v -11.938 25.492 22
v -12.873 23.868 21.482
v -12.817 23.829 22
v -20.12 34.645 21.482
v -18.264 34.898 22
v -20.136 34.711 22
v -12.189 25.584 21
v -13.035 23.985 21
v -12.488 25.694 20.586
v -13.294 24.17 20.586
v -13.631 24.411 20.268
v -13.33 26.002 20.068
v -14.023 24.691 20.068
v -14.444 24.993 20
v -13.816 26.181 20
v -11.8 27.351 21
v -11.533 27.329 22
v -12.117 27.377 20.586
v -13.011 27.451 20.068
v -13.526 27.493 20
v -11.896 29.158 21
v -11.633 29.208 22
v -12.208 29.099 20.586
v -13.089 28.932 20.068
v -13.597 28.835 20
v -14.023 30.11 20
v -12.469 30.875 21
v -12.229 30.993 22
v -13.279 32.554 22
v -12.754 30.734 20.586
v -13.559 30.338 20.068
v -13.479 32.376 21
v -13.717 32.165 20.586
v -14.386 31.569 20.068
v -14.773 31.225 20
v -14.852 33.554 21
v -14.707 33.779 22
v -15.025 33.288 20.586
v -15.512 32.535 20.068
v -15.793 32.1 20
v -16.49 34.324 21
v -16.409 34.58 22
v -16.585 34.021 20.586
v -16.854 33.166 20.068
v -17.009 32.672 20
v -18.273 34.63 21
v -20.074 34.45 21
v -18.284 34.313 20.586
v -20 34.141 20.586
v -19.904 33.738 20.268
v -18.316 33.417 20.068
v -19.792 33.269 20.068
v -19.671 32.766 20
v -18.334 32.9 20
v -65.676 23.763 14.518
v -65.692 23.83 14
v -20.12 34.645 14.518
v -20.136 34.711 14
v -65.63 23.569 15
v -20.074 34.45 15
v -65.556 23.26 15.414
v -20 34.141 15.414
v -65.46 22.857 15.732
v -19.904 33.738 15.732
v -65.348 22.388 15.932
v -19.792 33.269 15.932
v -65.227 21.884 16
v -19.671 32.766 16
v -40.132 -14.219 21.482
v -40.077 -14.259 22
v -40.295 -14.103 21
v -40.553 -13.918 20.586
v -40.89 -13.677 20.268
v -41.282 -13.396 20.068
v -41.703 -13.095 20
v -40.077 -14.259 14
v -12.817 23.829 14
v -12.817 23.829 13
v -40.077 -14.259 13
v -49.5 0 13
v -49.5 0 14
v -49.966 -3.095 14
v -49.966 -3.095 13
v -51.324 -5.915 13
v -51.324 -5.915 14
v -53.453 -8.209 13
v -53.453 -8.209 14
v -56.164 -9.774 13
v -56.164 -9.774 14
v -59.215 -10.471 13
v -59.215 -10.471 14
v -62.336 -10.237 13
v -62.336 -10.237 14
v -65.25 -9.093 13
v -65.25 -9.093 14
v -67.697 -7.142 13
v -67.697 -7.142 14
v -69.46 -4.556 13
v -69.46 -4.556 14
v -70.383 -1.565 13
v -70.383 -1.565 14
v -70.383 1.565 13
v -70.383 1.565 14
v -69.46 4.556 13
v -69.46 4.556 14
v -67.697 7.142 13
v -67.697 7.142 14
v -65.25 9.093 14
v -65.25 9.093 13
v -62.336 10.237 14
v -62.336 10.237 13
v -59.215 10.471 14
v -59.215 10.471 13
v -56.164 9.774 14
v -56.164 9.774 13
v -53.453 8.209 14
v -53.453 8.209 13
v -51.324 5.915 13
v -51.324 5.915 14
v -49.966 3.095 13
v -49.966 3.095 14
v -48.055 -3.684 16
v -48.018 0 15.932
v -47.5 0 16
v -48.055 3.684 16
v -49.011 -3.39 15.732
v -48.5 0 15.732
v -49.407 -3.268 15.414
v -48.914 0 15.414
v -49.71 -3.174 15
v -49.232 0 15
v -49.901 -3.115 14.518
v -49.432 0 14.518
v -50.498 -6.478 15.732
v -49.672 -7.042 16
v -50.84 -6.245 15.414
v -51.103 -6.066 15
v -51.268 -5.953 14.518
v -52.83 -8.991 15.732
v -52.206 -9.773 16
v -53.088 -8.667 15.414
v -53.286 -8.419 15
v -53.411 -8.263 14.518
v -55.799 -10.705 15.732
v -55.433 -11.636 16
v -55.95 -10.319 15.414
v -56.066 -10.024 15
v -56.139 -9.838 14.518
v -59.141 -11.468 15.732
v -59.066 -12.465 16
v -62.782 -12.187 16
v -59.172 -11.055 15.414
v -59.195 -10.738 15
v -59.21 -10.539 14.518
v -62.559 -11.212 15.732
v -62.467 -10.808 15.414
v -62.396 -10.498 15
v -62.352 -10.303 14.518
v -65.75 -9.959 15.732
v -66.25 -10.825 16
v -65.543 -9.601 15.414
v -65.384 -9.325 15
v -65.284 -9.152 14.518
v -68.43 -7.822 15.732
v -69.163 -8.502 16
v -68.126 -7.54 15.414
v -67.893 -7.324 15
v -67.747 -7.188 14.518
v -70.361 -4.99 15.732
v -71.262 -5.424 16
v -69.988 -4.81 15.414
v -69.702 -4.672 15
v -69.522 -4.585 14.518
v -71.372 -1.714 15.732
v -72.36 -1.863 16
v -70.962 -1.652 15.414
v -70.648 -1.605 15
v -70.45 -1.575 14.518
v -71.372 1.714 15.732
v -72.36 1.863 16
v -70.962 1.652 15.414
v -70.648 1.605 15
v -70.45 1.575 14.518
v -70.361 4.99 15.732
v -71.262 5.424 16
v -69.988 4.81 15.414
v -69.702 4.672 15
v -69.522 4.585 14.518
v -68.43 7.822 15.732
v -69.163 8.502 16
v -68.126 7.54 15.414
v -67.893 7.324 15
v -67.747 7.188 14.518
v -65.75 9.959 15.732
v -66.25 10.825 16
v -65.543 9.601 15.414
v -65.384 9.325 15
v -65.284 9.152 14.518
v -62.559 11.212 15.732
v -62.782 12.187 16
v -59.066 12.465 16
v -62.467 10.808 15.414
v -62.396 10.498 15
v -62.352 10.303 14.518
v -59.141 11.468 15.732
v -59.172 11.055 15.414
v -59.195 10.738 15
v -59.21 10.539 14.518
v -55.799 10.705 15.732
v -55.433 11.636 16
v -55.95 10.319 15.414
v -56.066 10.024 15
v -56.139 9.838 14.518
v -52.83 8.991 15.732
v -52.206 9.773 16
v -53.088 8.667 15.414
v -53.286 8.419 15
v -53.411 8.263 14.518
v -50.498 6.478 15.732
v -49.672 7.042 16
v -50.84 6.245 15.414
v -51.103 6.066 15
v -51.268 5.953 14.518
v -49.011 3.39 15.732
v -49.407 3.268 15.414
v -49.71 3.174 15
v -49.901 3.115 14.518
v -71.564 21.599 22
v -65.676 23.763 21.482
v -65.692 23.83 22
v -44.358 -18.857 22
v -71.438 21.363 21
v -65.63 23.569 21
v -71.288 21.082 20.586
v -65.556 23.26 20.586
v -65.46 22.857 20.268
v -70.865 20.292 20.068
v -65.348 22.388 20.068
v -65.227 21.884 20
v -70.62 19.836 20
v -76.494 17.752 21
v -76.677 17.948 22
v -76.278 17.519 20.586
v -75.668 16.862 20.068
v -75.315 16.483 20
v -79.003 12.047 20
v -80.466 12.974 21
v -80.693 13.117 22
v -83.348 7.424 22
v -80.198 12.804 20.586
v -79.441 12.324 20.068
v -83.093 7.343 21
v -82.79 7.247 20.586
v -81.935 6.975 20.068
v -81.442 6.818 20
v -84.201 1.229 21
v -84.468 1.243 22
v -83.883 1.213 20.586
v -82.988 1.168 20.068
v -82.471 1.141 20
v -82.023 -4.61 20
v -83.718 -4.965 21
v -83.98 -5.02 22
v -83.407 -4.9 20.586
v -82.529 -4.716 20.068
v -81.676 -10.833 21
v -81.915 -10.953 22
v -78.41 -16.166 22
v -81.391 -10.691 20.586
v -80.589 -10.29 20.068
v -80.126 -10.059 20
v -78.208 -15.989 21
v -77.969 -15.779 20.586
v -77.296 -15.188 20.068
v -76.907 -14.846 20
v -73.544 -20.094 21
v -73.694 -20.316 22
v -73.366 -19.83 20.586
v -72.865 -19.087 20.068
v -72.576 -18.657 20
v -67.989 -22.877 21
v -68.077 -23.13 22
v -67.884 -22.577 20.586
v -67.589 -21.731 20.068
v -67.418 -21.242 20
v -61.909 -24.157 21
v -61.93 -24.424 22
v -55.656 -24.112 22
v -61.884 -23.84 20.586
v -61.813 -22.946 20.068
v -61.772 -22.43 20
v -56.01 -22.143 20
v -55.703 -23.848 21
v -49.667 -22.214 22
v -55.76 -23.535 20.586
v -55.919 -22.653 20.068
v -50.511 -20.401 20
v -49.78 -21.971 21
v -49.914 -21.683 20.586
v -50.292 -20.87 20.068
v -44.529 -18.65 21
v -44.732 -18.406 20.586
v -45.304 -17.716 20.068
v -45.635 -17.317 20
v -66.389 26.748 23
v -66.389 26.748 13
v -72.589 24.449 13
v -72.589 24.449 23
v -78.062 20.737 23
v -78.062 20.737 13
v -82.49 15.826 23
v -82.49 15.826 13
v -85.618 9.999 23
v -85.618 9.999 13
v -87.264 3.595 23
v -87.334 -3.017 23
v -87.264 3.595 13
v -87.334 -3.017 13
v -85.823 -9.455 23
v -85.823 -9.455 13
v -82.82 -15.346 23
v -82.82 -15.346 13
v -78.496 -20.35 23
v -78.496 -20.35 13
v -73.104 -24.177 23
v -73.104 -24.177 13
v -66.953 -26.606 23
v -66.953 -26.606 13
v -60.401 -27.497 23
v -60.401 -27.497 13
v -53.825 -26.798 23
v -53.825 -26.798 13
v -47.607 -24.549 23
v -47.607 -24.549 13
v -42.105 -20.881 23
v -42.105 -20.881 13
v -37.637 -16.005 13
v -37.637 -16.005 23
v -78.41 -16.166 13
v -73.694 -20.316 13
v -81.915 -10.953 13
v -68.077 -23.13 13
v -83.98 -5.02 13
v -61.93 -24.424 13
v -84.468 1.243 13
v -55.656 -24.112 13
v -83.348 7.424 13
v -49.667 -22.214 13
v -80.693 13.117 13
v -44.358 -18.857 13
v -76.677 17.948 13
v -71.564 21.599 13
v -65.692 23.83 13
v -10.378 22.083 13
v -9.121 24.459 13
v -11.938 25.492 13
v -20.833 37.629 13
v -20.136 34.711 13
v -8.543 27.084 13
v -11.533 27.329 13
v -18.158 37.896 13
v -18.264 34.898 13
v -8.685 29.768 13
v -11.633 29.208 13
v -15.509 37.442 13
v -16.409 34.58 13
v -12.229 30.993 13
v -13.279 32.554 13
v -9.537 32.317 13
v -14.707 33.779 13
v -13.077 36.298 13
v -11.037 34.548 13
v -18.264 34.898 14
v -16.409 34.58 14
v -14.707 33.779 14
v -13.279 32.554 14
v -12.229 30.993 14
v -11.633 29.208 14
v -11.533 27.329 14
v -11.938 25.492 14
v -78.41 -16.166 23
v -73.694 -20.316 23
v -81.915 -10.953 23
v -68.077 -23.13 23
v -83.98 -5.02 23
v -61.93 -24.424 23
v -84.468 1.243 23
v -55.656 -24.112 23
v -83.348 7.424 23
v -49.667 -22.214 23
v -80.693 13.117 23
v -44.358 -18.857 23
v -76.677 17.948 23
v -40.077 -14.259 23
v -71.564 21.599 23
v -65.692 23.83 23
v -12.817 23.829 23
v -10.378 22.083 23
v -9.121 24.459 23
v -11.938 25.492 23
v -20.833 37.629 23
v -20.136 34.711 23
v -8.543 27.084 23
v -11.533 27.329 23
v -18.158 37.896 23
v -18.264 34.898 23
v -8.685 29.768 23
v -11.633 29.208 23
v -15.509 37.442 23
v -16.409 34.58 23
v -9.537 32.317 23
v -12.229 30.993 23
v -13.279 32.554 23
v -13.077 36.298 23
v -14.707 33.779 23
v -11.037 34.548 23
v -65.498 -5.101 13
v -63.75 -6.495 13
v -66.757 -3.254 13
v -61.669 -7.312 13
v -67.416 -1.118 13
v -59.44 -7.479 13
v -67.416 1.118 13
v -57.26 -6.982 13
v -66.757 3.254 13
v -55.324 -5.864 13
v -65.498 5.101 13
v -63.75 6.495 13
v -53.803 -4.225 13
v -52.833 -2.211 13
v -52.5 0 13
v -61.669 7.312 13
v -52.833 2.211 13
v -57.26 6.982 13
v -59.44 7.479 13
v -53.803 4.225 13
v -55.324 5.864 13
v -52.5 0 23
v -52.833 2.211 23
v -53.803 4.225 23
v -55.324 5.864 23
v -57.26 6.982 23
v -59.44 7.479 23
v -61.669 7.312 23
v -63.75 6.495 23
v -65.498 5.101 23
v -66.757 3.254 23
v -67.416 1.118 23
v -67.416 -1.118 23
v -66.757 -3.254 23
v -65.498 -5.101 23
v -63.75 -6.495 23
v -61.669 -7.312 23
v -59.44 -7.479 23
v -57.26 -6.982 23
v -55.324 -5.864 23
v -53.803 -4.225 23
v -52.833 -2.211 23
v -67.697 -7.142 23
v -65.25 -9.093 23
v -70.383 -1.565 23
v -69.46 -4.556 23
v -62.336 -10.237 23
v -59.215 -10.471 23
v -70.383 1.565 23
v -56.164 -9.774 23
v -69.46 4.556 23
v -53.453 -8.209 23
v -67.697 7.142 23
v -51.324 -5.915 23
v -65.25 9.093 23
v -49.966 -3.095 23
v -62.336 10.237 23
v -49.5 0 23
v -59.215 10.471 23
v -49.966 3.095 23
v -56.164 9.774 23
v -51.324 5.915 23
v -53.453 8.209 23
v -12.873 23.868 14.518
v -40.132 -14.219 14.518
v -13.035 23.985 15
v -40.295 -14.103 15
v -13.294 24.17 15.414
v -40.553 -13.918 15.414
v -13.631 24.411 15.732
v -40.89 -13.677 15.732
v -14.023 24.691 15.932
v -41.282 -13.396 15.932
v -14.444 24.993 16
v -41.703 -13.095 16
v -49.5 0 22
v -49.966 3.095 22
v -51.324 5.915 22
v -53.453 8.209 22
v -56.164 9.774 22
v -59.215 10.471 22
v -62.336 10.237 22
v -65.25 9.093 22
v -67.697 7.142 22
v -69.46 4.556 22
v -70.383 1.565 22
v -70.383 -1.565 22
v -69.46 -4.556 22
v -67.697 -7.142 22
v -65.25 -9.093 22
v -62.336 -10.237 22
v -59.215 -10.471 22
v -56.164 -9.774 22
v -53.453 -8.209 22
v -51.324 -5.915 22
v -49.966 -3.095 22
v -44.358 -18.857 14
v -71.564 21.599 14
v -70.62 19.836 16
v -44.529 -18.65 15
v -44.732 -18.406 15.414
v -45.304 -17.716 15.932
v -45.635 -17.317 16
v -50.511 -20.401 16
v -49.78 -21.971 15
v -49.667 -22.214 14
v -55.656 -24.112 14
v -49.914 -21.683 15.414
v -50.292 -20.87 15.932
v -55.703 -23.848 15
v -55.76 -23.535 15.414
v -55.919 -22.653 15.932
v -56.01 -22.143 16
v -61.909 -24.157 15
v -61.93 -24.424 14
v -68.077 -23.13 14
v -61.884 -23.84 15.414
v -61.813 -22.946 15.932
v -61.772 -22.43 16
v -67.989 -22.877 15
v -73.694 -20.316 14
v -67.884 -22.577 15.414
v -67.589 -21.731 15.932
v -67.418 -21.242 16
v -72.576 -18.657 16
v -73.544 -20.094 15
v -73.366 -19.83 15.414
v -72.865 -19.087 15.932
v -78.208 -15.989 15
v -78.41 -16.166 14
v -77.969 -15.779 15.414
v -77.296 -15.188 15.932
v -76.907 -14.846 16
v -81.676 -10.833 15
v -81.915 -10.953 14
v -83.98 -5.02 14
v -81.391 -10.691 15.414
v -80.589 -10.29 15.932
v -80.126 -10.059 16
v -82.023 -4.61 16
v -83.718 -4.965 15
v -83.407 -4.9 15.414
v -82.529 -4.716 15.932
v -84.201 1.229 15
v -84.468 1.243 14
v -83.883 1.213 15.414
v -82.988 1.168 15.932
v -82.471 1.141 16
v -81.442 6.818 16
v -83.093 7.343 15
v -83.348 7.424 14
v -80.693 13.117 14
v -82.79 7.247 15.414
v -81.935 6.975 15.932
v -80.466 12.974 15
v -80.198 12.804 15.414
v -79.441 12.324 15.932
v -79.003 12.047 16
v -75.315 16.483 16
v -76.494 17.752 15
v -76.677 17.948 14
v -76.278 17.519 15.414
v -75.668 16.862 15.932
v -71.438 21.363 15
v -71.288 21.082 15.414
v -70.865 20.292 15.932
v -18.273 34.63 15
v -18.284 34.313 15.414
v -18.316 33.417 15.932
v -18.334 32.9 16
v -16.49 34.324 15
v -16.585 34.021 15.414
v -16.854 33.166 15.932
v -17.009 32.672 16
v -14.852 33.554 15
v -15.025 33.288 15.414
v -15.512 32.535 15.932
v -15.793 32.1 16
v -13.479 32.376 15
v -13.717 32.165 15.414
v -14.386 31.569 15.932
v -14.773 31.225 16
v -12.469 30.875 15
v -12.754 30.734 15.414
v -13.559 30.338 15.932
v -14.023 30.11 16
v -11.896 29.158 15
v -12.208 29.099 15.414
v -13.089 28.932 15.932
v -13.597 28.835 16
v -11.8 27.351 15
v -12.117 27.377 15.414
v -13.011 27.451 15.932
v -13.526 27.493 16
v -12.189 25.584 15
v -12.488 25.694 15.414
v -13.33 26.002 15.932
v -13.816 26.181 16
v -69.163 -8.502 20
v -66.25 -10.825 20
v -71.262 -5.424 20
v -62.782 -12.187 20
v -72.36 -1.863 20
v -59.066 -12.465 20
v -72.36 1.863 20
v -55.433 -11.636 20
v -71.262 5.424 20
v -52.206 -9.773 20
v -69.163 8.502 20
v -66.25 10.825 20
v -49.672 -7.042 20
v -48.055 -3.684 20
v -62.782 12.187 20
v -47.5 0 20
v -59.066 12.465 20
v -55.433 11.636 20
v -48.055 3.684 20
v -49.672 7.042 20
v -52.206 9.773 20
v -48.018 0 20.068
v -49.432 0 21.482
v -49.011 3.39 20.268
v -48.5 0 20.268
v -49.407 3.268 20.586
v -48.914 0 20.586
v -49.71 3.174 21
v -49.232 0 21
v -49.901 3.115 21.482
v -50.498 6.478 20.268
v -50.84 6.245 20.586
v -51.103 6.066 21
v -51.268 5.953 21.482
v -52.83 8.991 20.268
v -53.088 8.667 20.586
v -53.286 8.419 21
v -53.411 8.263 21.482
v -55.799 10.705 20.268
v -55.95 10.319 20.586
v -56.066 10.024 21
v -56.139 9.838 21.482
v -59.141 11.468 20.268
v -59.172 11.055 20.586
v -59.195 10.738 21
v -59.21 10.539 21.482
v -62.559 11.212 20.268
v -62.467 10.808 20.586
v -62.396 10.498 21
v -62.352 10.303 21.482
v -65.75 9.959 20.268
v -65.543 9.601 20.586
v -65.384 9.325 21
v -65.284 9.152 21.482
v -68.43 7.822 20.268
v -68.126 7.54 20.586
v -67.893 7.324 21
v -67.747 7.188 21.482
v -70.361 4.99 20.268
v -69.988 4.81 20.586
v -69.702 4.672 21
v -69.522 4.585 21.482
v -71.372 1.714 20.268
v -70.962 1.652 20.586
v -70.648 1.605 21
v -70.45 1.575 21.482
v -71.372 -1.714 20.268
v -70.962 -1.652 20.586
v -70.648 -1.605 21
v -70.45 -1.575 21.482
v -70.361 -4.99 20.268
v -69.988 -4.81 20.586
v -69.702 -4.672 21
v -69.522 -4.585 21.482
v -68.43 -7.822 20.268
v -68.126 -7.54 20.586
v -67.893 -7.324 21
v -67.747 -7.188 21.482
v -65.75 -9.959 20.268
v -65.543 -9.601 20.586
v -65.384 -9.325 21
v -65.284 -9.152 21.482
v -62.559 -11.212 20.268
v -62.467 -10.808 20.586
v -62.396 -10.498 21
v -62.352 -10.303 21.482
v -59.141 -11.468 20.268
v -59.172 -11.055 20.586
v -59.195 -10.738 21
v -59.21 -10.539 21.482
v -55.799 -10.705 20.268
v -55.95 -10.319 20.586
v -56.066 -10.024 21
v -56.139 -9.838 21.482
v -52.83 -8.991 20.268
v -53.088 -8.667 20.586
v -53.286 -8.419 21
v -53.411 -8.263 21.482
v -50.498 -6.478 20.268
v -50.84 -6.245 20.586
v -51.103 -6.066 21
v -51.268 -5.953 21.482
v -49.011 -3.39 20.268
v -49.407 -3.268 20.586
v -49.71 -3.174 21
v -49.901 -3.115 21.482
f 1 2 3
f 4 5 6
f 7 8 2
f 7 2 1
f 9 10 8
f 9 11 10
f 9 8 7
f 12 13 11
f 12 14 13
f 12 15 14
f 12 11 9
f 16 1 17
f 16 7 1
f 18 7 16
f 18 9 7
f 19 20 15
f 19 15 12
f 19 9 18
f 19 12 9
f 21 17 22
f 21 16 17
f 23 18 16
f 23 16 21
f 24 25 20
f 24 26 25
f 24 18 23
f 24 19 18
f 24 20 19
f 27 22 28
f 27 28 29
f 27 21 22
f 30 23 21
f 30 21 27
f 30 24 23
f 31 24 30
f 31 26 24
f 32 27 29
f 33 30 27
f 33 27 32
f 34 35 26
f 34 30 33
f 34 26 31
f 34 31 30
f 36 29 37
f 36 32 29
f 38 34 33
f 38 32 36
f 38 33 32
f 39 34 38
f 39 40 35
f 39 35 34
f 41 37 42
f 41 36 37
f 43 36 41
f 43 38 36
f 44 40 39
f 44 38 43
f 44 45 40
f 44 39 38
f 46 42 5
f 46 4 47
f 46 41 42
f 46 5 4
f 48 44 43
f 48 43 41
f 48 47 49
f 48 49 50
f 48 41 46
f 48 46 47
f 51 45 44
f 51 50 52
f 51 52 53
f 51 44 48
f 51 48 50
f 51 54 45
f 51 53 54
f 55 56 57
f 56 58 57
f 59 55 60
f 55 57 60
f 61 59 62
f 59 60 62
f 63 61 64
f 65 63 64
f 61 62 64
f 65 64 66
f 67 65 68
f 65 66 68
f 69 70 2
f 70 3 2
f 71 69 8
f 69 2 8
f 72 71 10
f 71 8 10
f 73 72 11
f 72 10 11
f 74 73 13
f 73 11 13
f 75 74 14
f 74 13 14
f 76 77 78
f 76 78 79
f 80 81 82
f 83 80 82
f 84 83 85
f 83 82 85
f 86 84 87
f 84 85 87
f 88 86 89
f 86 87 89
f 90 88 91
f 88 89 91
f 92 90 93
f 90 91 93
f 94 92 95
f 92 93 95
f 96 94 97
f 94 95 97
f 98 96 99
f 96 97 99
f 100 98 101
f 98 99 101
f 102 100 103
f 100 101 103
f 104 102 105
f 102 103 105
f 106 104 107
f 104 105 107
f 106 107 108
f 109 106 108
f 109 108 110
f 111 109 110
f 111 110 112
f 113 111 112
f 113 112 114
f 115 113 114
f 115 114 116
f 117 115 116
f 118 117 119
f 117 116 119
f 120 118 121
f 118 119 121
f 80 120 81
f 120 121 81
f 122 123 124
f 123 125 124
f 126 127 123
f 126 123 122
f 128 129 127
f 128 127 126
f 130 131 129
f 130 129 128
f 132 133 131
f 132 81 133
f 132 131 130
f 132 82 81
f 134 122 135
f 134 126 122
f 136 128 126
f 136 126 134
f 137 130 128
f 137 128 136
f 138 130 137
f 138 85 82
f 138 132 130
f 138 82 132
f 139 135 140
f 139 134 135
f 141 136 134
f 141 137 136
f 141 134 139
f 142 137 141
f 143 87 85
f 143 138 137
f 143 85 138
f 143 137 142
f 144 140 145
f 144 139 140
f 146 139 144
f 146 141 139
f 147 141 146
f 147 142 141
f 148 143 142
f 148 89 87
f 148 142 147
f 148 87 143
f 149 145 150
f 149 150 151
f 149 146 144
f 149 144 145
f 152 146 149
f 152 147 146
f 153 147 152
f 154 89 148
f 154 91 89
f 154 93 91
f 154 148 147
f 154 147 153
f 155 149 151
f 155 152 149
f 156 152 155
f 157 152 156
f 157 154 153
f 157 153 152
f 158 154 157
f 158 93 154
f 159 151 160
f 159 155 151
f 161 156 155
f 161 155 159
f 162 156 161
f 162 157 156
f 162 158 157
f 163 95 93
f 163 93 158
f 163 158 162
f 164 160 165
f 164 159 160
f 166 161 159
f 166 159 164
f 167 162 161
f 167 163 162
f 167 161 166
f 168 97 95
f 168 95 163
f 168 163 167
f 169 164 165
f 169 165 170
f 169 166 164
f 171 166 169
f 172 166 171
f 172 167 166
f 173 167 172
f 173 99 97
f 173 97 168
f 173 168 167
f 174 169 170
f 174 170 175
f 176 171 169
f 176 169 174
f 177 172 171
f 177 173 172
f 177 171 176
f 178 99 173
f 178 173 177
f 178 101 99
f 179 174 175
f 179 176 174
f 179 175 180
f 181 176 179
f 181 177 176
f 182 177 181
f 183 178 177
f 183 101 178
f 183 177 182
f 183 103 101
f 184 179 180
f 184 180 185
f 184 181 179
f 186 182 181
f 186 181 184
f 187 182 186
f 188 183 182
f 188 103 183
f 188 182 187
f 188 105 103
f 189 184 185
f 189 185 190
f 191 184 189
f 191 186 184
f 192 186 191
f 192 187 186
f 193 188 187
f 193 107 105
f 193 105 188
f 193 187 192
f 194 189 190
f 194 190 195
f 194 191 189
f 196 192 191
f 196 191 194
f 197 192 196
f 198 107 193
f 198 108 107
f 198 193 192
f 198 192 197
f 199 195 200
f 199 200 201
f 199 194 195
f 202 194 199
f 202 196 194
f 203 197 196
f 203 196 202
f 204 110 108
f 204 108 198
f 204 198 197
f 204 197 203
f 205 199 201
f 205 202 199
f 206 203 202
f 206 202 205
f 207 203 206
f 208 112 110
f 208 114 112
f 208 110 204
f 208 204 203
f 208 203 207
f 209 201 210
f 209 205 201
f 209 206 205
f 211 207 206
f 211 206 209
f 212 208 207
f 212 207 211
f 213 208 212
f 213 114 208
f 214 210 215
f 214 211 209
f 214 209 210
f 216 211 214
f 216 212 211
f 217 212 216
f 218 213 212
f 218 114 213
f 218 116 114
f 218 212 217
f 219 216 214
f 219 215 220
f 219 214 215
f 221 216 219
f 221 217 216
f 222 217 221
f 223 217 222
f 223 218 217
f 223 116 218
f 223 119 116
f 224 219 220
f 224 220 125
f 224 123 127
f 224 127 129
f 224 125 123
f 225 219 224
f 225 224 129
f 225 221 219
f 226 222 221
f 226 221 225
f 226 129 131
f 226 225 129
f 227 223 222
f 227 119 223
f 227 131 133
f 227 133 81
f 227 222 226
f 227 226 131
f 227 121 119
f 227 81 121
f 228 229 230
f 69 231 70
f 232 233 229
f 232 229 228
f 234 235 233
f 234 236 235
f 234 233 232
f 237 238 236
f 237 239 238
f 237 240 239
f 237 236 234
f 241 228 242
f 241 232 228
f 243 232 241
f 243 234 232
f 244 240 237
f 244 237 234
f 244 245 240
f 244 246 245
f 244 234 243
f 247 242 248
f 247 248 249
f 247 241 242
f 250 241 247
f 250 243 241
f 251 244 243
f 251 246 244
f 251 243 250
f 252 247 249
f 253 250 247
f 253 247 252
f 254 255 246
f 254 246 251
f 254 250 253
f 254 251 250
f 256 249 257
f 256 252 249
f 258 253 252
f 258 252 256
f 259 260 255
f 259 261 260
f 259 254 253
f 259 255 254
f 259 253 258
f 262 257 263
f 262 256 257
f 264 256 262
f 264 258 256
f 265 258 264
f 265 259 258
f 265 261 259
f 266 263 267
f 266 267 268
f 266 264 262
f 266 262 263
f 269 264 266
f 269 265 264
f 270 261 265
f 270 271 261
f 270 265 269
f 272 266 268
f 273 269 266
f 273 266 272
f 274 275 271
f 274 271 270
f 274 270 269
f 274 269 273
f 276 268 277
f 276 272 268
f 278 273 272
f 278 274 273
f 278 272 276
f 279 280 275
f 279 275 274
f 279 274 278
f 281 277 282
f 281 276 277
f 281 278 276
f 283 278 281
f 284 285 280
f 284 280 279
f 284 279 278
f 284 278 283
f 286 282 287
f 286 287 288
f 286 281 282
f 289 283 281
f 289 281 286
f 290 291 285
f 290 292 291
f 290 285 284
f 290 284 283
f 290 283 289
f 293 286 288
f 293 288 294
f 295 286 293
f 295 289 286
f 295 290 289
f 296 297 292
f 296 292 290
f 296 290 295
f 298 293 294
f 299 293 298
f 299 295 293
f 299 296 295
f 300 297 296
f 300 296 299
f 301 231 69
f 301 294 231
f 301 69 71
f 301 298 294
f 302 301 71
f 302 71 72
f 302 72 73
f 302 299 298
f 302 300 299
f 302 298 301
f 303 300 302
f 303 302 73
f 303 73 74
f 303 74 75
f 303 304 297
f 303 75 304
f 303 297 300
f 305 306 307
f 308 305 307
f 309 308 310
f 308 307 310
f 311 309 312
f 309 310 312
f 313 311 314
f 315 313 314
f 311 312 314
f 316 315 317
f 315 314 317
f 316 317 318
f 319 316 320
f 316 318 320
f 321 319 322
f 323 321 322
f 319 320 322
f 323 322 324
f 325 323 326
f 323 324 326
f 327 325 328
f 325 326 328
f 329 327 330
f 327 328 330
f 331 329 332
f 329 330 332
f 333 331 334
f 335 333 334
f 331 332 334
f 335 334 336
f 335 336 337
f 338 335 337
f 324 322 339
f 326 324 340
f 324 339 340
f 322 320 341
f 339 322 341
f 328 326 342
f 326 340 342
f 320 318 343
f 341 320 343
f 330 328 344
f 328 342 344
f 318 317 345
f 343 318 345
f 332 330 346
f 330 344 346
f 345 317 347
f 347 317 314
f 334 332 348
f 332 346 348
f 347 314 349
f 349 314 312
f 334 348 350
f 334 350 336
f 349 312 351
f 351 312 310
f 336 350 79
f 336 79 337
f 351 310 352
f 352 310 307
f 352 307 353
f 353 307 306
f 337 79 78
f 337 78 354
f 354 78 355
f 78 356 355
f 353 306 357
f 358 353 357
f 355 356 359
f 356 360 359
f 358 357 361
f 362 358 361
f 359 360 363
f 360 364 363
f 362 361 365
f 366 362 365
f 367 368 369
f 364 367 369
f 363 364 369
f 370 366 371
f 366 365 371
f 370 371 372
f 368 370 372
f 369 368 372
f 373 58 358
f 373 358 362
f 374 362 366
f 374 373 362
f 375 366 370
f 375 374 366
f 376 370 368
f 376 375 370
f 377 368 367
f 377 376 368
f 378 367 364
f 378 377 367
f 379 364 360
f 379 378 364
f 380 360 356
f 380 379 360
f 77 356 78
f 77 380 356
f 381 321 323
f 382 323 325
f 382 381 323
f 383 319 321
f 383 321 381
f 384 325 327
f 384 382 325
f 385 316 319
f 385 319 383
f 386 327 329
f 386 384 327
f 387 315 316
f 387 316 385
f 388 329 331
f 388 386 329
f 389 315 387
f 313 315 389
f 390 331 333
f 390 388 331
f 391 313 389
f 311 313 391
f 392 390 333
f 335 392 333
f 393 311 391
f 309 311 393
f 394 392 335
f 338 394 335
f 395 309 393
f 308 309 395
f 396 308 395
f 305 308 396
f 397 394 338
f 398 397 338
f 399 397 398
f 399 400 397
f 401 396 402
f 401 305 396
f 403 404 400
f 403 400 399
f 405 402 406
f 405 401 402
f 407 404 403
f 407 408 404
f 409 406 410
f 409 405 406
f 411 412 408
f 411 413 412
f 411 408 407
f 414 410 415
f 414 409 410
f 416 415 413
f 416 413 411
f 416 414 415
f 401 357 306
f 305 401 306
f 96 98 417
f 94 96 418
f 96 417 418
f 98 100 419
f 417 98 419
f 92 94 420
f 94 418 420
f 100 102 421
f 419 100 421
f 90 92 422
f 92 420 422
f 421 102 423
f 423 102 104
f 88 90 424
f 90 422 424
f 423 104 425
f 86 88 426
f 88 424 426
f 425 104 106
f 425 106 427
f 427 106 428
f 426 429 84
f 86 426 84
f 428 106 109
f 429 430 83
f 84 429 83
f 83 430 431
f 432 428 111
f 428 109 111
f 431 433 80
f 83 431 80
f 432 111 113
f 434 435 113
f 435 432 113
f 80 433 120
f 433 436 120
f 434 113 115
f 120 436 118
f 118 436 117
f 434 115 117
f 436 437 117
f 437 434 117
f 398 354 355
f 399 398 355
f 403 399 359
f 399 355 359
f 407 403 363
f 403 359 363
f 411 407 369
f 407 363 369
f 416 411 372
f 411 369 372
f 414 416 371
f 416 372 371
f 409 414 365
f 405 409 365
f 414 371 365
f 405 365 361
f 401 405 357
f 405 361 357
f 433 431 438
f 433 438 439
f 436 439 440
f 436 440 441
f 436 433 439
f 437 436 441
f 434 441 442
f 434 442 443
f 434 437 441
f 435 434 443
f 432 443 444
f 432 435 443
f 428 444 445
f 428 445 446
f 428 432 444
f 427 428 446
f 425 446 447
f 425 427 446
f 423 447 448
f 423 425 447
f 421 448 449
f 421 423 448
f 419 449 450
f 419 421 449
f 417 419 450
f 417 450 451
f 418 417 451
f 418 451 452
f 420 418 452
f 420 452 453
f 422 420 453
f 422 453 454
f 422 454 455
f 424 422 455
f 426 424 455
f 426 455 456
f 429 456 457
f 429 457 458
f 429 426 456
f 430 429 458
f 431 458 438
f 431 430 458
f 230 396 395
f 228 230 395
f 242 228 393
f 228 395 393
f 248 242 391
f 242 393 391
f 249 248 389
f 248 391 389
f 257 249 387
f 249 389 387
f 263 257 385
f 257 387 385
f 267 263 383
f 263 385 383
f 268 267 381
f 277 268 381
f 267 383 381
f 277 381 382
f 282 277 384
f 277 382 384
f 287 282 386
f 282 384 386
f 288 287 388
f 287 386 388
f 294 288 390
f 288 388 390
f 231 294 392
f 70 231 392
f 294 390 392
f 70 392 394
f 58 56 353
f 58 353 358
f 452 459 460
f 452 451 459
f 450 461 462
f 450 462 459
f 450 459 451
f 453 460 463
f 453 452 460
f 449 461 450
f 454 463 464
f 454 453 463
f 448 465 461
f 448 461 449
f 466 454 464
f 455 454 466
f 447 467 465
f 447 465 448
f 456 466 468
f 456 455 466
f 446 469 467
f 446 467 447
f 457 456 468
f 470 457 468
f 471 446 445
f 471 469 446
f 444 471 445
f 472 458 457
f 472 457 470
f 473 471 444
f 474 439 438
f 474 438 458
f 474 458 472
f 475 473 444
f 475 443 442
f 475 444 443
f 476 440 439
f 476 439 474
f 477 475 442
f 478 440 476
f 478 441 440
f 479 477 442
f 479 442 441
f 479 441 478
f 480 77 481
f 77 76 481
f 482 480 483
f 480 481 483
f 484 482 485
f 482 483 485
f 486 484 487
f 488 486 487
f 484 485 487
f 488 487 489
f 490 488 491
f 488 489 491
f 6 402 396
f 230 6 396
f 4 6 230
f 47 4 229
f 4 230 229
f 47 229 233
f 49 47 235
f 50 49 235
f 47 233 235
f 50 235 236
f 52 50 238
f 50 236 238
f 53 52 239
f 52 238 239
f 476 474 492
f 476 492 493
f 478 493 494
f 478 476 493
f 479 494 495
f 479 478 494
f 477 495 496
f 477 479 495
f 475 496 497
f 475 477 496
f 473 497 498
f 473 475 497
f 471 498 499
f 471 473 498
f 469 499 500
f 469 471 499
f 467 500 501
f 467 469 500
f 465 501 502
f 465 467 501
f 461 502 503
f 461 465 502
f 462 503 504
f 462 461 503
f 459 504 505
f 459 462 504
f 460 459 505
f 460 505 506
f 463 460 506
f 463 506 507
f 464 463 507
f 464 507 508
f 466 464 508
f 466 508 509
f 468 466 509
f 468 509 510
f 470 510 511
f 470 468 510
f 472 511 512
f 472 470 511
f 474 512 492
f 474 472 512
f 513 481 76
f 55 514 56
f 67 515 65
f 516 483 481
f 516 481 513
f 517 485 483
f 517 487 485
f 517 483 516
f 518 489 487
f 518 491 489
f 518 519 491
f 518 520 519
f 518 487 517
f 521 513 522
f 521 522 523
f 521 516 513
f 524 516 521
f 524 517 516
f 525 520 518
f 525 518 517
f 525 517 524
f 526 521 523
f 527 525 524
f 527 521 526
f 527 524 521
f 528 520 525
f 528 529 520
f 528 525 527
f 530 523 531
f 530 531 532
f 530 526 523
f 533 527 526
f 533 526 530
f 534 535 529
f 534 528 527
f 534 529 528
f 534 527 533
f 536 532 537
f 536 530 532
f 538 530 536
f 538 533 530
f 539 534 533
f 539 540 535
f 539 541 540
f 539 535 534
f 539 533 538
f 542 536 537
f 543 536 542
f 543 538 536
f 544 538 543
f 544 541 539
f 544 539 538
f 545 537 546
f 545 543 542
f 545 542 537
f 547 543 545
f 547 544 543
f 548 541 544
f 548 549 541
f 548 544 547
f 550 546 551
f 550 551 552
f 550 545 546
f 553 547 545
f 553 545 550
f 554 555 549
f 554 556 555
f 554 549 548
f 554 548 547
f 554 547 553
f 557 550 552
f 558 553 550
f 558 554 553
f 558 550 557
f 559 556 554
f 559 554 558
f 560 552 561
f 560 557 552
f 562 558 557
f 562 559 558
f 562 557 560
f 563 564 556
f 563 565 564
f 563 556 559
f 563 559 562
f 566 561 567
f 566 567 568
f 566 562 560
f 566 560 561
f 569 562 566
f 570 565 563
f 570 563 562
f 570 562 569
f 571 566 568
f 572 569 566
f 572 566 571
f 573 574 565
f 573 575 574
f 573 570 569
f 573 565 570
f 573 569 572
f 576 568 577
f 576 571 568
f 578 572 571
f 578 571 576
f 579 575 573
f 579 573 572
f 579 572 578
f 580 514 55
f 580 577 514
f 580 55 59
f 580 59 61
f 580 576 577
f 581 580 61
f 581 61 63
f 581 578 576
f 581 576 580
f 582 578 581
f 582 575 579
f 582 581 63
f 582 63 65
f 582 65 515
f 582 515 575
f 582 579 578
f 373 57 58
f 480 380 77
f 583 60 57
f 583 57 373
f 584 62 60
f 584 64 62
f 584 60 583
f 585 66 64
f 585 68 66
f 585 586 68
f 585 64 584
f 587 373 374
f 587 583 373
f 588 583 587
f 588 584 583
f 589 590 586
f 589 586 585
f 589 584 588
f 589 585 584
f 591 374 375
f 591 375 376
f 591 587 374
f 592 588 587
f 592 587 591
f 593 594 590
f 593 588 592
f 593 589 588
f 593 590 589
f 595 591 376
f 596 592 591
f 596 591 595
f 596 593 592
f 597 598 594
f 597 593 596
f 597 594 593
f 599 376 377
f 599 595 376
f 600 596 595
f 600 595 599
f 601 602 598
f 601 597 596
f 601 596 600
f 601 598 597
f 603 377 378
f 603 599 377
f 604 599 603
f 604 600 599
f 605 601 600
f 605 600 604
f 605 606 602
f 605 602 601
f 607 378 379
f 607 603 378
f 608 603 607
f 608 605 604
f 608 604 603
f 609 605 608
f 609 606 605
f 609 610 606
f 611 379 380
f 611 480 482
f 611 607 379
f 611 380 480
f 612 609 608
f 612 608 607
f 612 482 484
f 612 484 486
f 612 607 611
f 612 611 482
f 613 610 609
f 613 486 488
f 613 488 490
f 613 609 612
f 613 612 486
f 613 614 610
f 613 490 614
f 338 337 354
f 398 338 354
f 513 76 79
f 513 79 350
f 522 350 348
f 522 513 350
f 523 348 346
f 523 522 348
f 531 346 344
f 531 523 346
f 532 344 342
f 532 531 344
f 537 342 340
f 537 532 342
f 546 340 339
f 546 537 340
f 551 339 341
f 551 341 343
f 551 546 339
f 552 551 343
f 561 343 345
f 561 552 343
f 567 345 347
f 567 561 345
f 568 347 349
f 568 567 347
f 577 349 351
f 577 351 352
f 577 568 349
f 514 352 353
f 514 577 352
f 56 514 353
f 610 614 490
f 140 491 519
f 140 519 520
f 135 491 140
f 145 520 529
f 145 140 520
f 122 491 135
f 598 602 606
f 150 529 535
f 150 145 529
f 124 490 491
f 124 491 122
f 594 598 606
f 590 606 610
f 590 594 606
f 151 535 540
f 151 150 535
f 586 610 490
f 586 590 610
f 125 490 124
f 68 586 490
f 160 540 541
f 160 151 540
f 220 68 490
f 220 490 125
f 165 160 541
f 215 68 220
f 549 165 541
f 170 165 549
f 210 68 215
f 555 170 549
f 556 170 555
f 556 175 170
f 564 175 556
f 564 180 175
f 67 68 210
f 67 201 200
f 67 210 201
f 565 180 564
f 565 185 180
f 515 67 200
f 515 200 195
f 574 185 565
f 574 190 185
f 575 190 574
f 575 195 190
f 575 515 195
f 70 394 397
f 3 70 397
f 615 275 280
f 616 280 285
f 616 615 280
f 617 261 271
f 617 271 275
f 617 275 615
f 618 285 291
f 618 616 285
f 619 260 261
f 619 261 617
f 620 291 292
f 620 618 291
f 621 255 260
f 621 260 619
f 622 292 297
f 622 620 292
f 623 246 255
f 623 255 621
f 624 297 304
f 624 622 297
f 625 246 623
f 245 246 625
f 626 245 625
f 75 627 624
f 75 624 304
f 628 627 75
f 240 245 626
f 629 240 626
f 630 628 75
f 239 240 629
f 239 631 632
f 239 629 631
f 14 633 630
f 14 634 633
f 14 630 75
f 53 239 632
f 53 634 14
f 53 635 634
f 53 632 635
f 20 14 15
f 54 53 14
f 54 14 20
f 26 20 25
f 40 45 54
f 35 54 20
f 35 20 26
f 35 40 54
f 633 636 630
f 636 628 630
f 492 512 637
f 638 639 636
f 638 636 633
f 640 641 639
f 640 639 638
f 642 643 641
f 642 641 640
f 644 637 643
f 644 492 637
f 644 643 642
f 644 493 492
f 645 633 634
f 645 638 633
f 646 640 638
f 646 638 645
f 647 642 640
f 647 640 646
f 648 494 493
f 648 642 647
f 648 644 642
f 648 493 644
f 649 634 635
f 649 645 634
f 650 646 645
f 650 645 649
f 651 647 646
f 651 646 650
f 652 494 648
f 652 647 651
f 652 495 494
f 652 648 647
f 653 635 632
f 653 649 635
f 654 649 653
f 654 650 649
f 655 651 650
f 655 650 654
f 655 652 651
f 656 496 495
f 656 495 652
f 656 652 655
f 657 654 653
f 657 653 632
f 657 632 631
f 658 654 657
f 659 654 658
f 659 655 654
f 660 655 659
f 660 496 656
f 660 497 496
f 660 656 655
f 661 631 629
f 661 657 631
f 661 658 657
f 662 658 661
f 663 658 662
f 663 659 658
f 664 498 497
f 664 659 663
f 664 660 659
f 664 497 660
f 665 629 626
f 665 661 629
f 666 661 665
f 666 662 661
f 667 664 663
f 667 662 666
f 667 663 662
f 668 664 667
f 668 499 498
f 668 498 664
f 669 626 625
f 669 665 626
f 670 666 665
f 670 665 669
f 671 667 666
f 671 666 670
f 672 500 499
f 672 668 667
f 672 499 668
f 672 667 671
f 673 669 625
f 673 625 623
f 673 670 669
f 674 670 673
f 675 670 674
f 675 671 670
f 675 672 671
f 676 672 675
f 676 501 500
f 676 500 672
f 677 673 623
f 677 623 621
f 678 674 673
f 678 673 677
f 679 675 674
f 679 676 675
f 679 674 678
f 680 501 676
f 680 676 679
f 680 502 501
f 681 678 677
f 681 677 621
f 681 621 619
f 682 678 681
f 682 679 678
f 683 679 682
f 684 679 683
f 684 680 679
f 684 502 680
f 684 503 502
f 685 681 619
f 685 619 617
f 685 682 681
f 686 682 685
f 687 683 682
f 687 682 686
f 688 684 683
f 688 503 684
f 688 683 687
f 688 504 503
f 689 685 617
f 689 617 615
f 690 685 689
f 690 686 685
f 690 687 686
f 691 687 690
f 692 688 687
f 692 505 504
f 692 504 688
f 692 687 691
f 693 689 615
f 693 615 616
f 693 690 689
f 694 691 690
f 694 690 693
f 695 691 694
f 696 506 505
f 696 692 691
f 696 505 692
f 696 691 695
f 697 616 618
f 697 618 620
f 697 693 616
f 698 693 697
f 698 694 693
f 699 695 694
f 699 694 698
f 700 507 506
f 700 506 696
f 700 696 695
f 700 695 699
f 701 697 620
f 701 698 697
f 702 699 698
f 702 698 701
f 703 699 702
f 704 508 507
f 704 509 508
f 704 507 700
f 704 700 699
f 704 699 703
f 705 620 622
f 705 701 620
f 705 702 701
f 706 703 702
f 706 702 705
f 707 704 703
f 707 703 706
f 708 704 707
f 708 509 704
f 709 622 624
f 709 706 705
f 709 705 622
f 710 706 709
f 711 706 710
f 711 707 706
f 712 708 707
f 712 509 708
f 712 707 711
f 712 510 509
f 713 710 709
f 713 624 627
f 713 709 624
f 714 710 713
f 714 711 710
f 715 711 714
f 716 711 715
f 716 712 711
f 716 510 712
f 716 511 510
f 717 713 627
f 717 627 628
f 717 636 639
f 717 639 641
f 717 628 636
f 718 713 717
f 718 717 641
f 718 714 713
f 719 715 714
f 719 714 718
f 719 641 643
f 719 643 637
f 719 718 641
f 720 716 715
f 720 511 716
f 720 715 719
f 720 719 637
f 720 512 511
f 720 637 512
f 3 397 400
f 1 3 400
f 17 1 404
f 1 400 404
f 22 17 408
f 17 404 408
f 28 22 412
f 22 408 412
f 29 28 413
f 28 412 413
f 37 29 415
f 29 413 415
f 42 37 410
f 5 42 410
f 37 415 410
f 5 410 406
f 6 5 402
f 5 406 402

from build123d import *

# Parameters (mm, degrees)
SKETCH2_R           = 7.5
BOSS_EXTRUDE1_DEPTH = 10
SKETCH3_R           = 10.5
CUT_EXTRUDE1_DEPTH  = 3
CUT_EXTRUDE2_START  = -3
SKETCH4_R           = 10.5
CUT_EXTRUDE2_DEPTH  = 3
FILLET1_R           = 2


with BuildPart() as part:
    # Sketch2 → Boss-Extrude1 (new body)
    with BuildSketch(Plane.XY.offset(13)):
        with BuildLine():
            Line((-20.832934418, 37.628991133), (-66.388883934, 26.747563666))
            ThreePointArc((-66.388883934, 26.747563666), (-82.819662857, -15.34643239), (-37.637352066, -16.005060993))
            Line((-37.637352066, -16.005060993), (-10.377831921, 22.082582166))
            ThreePointArc((-10.377831921, 22.082582166), (-10.211644676, 33.483125214), (-20.832934418, 37.628991133))
        make_face()
        with Locations((-60, 0)):
            Circle(SKETCH2_R, mode=Mode.SUBTRACT)
    extrude(amount=BOSS_EXTRUDE1_DEPTH)

    # Sketch3 → Cut-Extrude1 (cut)
    with BuildSketch(Plane.XY.offset(23)):
        with BuildLine():
            Line((-20.135965261, 34.711075097), (-65.691914777, 23.82964763))
            ThreePointArc((-65.691914777, 23.82964763), (-80.330245091, -13.672276129), (-40.076913659, -14.25905434))
            Line((-40.076913659, -14.25905434), (-12.817393513, 23.82858882))
            ThreePointArc((-12.817393513, 23.82858882), (-12.701062442, 31.808968954), (-20.135965261, 34.711075097))
        make_face()
        with Locations((-60, 0)):
            Circle(SKETCH3_R, mode=Mode.SUBTRACT)
    extrude(amount=-CUT_EXTRUDE1_DEPTH, mode=Mode.SUBTRACT)

    # Sketch4 → Cut-Extrude2 (cut)
    with BuildSketch(Plane(origin=(0, 0, 13), x_dir=(-1, 0, 0), z_dir=(0, 0, -1)).offset(CUT_EXTRUDE2_START)):
        with BuildLine():
            Line((65.691914777, 23.82964763), (20.135965261, 34.711075097))
            ThreePointArc((20.135965261, 34.711075097), (12.701062442, 31.808968954), (12.817393513, 23.82858882))
            Line((12.817393513, 23.82858882), (40.076913659, -14.25905434))
            ThreePointArc((40.076913659, -14.25905434), (80.330245091, -13.672276129), (65.691914777, 23.82964763))
        make_face()
        with Locations(Location((60, 0, 0), (0, 0, 180))):
            Circle(SKETCH4_R, mode=Mode.SUBTRACT)
    extrude(amount=CUT_EXTRUDE2_DEPTH, mode=Mode.SUBTRACT)

    # Fillet1
    fillet1_edges = [part.edges().sort_by_distance(p)[0] for p in [
        (-42.913940019, 29.270361363, 20),
        (-12.701062442, 31.808968954, 20),
        (-26.447153586, 4.78476724, 20),
        (-80.330245091, -13.672276129, 20),
        (-70.5, 0, 20),
        (-12.701062442, 31.808968954, 16),
        (-42.913940019, 29.270361363, 16),
        (-80.330245091, -13.672276129, 16),
        (-26.447153586, 4.78476724, 16),
        (-70.5, 0, 16),
    ]]
    fillet(fillet1_edges, radius=FILLET1_R)


solid = part.part
